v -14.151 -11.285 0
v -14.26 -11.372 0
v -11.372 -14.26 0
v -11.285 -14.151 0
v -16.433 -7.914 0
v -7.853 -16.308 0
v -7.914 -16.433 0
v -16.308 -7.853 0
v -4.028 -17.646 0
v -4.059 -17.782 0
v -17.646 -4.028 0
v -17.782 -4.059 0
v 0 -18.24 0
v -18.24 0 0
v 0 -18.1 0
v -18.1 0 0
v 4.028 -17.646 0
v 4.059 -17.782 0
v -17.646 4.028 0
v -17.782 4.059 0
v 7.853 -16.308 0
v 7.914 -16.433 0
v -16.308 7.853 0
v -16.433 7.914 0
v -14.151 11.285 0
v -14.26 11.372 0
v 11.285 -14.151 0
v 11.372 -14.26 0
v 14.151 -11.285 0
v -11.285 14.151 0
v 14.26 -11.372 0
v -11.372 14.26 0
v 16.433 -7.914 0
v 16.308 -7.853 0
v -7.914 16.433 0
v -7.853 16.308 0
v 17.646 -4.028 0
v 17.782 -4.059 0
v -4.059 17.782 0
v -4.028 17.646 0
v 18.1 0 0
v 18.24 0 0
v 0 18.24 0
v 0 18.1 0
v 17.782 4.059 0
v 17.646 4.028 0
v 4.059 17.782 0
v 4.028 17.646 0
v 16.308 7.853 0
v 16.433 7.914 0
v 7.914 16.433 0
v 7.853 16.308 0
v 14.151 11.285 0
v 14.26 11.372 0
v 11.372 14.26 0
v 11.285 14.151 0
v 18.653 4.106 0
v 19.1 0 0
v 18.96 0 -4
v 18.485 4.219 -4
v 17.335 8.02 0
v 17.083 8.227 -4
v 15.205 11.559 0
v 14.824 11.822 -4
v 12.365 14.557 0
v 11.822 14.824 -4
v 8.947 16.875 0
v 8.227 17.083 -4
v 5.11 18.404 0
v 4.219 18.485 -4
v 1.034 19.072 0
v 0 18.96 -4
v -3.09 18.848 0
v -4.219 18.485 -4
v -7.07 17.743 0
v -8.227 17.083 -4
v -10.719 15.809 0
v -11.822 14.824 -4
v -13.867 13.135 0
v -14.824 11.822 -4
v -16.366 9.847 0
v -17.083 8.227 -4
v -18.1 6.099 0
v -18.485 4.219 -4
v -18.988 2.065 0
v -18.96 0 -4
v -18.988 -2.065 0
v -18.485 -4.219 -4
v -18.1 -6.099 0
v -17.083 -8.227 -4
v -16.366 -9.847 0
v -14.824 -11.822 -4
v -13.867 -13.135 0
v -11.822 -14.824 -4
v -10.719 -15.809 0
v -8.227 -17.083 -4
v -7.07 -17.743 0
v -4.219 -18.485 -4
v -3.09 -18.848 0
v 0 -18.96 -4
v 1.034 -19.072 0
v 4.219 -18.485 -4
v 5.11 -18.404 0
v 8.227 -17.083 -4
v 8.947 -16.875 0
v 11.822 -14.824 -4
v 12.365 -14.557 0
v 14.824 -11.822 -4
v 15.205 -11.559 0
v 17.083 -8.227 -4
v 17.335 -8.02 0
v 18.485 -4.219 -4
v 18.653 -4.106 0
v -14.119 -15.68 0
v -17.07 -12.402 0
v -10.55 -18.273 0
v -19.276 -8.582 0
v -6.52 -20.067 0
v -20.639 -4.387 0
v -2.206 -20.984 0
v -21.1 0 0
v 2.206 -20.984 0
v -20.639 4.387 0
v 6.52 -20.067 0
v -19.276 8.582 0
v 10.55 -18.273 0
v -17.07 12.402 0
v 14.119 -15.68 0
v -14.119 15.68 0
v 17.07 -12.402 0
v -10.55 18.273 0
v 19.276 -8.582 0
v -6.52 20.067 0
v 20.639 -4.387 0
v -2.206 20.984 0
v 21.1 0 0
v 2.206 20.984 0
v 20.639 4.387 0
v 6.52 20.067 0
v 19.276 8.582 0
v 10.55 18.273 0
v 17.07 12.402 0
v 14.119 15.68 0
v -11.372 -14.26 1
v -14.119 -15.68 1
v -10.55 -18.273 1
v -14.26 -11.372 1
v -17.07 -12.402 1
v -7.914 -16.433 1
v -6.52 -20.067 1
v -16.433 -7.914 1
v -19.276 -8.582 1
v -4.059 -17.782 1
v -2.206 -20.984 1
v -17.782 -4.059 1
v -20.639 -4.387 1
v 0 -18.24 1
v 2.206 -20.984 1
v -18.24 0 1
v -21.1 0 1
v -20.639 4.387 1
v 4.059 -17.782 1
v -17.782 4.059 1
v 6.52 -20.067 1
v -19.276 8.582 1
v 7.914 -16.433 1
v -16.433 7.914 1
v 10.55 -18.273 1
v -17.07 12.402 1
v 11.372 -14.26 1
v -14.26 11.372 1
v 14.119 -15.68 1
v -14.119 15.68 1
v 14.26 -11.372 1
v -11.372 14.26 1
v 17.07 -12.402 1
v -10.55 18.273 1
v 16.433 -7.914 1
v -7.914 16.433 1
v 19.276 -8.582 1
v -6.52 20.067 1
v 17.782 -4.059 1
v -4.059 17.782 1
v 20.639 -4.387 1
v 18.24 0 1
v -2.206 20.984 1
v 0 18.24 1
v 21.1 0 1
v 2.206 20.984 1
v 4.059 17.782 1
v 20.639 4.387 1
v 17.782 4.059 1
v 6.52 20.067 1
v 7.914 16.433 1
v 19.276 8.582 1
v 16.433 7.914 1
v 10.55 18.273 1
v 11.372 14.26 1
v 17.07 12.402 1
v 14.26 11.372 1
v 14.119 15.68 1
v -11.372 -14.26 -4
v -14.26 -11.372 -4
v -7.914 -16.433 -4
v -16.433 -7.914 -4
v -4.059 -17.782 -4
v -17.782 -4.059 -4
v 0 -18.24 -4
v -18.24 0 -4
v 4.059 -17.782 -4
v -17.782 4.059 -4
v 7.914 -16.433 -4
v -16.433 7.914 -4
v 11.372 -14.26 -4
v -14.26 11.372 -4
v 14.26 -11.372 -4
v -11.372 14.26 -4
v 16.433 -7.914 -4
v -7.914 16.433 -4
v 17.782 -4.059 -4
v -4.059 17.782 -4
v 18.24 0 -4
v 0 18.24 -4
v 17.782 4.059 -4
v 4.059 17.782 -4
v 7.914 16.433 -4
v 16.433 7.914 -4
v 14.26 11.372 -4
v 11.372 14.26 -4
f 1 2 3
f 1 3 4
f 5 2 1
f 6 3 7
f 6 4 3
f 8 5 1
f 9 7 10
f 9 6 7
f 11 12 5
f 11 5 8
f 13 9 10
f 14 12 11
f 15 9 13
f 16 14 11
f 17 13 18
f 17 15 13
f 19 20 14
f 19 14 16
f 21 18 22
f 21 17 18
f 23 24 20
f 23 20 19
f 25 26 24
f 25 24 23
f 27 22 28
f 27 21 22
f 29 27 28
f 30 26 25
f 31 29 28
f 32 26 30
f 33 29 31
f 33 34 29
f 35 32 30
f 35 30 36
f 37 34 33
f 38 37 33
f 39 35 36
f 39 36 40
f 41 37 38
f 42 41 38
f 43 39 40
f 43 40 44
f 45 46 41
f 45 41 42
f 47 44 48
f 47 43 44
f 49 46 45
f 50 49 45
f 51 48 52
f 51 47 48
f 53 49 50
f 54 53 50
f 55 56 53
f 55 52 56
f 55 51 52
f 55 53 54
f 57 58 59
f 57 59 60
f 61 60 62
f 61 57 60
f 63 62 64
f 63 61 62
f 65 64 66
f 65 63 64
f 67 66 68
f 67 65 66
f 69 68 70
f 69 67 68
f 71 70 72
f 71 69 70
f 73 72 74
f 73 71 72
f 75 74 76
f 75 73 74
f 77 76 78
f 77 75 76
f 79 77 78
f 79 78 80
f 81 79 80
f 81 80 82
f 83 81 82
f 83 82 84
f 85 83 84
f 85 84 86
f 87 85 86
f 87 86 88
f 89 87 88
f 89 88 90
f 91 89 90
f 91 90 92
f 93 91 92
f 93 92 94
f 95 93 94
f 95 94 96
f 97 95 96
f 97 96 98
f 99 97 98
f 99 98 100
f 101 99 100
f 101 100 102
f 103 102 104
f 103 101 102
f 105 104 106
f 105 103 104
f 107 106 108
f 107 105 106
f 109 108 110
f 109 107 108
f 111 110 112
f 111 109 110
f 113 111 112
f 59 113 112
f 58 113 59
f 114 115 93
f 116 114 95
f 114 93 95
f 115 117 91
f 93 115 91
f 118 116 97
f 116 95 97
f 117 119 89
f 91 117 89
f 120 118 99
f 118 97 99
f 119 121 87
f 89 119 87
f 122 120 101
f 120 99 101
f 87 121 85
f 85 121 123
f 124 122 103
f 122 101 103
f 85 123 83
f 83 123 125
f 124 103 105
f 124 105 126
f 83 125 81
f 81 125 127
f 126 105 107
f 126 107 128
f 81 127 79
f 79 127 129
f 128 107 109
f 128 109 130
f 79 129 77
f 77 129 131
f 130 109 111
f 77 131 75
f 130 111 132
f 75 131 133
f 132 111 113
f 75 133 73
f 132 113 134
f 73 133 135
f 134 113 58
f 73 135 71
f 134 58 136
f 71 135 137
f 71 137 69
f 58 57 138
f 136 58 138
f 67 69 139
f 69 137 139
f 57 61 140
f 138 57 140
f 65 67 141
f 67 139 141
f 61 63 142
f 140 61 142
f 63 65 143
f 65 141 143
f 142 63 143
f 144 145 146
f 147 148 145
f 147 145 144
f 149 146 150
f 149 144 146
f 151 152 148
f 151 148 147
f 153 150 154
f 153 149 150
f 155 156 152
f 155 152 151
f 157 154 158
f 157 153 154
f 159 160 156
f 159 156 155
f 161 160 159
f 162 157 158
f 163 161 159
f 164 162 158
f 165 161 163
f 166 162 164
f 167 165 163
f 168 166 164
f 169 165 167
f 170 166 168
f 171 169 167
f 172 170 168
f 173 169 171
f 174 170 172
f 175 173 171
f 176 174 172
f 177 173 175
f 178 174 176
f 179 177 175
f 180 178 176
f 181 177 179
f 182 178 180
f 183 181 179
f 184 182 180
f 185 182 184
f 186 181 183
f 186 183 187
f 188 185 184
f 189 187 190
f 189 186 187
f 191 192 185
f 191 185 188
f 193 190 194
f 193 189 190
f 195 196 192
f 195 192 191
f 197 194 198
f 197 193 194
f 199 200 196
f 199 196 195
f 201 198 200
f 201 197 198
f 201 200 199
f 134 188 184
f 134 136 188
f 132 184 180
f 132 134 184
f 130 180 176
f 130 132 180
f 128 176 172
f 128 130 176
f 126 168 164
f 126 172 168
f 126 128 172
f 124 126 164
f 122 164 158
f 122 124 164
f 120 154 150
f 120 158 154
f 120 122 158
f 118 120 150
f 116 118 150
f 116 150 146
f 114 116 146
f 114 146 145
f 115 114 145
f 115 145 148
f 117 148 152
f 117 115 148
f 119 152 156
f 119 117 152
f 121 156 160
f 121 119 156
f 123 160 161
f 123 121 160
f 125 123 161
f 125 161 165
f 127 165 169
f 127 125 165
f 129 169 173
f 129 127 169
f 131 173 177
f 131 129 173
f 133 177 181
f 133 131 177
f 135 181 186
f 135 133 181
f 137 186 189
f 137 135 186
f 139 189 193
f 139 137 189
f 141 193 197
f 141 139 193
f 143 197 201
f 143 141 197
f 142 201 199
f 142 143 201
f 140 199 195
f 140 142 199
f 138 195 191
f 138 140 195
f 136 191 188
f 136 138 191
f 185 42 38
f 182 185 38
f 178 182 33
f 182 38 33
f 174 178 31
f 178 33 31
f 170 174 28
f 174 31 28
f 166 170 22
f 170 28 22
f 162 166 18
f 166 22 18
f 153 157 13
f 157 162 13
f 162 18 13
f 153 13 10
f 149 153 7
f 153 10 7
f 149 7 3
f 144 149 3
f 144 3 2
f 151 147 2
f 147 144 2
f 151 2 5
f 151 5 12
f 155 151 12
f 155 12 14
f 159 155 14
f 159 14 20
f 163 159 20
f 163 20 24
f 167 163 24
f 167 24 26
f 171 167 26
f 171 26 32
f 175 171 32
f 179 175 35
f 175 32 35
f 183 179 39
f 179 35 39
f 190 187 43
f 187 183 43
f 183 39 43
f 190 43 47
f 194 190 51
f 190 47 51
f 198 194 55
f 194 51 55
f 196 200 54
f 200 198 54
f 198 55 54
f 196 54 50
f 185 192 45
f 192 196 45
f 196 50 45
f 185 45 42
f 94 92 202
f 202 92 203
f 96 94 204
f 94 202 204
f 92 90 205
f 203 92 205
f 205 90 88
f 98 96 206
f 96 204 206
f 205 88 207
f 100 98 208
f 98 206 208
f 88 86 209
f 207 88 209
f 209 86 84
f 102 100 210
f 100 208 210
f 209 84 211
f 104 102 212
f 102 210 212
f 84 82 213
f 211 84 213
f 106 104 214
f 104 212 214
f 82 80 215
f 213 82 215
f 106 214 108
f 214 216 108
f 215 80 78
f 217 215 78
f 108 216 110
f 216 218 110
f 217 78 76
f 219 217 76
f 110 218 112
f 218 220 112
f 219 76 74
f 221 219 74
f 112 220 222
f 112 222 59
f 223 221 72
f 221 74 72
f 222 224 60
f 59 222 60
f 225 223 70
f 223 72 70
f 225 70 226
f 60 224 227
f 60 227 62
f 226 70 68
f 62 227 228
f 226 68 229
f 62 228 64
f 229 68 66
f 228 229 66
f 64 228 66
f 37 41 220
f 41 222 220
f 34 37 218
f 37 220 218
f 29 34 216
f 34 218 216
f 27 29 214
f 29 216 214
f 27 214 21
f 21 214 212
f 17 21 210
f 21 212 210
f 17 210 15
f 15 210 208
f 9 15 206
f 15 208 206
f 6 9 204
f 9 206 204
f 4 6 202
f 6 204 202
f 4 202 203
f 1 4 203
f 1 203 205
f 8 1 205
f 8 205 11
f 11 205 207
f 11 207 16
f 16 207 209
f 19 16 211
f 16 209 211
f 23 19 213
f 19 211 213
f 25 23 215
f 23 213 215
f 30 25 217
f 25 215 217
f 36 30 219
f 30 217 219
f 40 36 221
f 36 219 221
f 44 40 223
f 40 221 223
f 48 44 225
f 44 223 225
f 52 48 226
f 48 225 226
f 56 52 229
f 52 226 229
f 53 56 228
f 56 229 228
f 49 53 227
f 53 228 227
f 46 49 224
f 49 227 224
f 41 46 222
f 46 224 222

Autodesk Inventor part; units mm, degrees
ref_plane "YZ Plane" through (0, 0, 0) normal (1, 0, 0) x (0, 1, 0)
ref_plane "XZ Plane" through (0, 0, 0) normal (0, 1, 0) x (-1, 0, 0)
sketch "Sketch1" plane through (0, 0, 0) normal (0, 0, 1) x (1, 0, 0)
  line L0 (16.8, 24.9006) -> (-16.8, 24.9006) projected
  line L1 (-16.8, 24.9006) -> (-16.8, 21.2406) projected
  line L2 (-16.8, 21.2406) -> (-21.2406, 16.8) projected
  line L3 (-21.2406, 16.8) -> (-24.9006, 16.8) projected
  line L4 (-24.9006, 16.8) -> (-24.9006, -16.8) projected
  line L5 (-24.9006, -16.8) -> (-21.2406, -16.8) projected
  line L6 (-21.2406, -16.8) -> (-16.8, -21.2406) projected
  line L7 (-16.8, -21.2406) -> (-16.8, -24.9006) projected
  line L8 (-16.8, -24.9006) -> (16.8, -24.9006) projected
  line L9 (16.8, -24.9006) -> (16.8, -21.2406) projected
  line L10 (16.8, -21.2406) -> (21.2406, -16.8) projected
  line L11 (21.2406, -16.8) -> (24.9006, -16.8) projected
  line L12 (24.9006, -16.8) -> (24.9006, 16.8) projected
  line L13 (24.9006, 16.8) -> (21.2406, 16.8) projected
  line L14 (21.2406, 16.8) -> (16.8, 21.2406) projected
  line L15 (16.8, 21.2406) -> (16.8, 24.9006) projected
  arc A0 (-24.9006, -4.1858) -> (-4.1858, -24.9006) centre (0, 0) ccw
  circle A1 centre (0, 0) radius 19.1
  circle A2 centre (0, 0) radius 18.1
  circle A3 centre (0, 0) radius 20.6
  circle A4 centre (0, 0) radius 19.6 construction
  circle A5 centre (0, 0) radius 20.6 construction
  circle A6 centre (0, 0) radius 20.6 construction
  point P0 (0, 0)
  dimension "d14" = 38.2
  dimension "d17" = 1
ref_plane "Work Plane1" through (-13.5, -13.5, -4) normal (0, 0, 1) x (1, 0, 0)
extrude "Extrusion1" add sketch "Sketch1" against normal blind 4 draft -2 contours A1
sketch "Sketch2" plane through (0, 0, 0) normal (0, 0, 1) x (1, 0, 0)
  line L0 (0, -33.742) -> (0, 37.252) construction
  arc A0 (2, 25.1004) -> (-2, 25.1004) centre (0, 25.11) ccw
  circle A1 centre (0, 0) radius 19.1 projected
  circle A2 centre (0, 0) radius 21.1
  circle A3 centre (0, 0) radius 18.2397 projected
  point P0 (0, 0)
  dimension "d5" = 2
  dimension "d16" = 2
extrude "Extrusion2" add sketch "Sketch2" along normal blind 1 contours A1 | A2
properties part number "20_Lens_holder_156mm_clamp"
